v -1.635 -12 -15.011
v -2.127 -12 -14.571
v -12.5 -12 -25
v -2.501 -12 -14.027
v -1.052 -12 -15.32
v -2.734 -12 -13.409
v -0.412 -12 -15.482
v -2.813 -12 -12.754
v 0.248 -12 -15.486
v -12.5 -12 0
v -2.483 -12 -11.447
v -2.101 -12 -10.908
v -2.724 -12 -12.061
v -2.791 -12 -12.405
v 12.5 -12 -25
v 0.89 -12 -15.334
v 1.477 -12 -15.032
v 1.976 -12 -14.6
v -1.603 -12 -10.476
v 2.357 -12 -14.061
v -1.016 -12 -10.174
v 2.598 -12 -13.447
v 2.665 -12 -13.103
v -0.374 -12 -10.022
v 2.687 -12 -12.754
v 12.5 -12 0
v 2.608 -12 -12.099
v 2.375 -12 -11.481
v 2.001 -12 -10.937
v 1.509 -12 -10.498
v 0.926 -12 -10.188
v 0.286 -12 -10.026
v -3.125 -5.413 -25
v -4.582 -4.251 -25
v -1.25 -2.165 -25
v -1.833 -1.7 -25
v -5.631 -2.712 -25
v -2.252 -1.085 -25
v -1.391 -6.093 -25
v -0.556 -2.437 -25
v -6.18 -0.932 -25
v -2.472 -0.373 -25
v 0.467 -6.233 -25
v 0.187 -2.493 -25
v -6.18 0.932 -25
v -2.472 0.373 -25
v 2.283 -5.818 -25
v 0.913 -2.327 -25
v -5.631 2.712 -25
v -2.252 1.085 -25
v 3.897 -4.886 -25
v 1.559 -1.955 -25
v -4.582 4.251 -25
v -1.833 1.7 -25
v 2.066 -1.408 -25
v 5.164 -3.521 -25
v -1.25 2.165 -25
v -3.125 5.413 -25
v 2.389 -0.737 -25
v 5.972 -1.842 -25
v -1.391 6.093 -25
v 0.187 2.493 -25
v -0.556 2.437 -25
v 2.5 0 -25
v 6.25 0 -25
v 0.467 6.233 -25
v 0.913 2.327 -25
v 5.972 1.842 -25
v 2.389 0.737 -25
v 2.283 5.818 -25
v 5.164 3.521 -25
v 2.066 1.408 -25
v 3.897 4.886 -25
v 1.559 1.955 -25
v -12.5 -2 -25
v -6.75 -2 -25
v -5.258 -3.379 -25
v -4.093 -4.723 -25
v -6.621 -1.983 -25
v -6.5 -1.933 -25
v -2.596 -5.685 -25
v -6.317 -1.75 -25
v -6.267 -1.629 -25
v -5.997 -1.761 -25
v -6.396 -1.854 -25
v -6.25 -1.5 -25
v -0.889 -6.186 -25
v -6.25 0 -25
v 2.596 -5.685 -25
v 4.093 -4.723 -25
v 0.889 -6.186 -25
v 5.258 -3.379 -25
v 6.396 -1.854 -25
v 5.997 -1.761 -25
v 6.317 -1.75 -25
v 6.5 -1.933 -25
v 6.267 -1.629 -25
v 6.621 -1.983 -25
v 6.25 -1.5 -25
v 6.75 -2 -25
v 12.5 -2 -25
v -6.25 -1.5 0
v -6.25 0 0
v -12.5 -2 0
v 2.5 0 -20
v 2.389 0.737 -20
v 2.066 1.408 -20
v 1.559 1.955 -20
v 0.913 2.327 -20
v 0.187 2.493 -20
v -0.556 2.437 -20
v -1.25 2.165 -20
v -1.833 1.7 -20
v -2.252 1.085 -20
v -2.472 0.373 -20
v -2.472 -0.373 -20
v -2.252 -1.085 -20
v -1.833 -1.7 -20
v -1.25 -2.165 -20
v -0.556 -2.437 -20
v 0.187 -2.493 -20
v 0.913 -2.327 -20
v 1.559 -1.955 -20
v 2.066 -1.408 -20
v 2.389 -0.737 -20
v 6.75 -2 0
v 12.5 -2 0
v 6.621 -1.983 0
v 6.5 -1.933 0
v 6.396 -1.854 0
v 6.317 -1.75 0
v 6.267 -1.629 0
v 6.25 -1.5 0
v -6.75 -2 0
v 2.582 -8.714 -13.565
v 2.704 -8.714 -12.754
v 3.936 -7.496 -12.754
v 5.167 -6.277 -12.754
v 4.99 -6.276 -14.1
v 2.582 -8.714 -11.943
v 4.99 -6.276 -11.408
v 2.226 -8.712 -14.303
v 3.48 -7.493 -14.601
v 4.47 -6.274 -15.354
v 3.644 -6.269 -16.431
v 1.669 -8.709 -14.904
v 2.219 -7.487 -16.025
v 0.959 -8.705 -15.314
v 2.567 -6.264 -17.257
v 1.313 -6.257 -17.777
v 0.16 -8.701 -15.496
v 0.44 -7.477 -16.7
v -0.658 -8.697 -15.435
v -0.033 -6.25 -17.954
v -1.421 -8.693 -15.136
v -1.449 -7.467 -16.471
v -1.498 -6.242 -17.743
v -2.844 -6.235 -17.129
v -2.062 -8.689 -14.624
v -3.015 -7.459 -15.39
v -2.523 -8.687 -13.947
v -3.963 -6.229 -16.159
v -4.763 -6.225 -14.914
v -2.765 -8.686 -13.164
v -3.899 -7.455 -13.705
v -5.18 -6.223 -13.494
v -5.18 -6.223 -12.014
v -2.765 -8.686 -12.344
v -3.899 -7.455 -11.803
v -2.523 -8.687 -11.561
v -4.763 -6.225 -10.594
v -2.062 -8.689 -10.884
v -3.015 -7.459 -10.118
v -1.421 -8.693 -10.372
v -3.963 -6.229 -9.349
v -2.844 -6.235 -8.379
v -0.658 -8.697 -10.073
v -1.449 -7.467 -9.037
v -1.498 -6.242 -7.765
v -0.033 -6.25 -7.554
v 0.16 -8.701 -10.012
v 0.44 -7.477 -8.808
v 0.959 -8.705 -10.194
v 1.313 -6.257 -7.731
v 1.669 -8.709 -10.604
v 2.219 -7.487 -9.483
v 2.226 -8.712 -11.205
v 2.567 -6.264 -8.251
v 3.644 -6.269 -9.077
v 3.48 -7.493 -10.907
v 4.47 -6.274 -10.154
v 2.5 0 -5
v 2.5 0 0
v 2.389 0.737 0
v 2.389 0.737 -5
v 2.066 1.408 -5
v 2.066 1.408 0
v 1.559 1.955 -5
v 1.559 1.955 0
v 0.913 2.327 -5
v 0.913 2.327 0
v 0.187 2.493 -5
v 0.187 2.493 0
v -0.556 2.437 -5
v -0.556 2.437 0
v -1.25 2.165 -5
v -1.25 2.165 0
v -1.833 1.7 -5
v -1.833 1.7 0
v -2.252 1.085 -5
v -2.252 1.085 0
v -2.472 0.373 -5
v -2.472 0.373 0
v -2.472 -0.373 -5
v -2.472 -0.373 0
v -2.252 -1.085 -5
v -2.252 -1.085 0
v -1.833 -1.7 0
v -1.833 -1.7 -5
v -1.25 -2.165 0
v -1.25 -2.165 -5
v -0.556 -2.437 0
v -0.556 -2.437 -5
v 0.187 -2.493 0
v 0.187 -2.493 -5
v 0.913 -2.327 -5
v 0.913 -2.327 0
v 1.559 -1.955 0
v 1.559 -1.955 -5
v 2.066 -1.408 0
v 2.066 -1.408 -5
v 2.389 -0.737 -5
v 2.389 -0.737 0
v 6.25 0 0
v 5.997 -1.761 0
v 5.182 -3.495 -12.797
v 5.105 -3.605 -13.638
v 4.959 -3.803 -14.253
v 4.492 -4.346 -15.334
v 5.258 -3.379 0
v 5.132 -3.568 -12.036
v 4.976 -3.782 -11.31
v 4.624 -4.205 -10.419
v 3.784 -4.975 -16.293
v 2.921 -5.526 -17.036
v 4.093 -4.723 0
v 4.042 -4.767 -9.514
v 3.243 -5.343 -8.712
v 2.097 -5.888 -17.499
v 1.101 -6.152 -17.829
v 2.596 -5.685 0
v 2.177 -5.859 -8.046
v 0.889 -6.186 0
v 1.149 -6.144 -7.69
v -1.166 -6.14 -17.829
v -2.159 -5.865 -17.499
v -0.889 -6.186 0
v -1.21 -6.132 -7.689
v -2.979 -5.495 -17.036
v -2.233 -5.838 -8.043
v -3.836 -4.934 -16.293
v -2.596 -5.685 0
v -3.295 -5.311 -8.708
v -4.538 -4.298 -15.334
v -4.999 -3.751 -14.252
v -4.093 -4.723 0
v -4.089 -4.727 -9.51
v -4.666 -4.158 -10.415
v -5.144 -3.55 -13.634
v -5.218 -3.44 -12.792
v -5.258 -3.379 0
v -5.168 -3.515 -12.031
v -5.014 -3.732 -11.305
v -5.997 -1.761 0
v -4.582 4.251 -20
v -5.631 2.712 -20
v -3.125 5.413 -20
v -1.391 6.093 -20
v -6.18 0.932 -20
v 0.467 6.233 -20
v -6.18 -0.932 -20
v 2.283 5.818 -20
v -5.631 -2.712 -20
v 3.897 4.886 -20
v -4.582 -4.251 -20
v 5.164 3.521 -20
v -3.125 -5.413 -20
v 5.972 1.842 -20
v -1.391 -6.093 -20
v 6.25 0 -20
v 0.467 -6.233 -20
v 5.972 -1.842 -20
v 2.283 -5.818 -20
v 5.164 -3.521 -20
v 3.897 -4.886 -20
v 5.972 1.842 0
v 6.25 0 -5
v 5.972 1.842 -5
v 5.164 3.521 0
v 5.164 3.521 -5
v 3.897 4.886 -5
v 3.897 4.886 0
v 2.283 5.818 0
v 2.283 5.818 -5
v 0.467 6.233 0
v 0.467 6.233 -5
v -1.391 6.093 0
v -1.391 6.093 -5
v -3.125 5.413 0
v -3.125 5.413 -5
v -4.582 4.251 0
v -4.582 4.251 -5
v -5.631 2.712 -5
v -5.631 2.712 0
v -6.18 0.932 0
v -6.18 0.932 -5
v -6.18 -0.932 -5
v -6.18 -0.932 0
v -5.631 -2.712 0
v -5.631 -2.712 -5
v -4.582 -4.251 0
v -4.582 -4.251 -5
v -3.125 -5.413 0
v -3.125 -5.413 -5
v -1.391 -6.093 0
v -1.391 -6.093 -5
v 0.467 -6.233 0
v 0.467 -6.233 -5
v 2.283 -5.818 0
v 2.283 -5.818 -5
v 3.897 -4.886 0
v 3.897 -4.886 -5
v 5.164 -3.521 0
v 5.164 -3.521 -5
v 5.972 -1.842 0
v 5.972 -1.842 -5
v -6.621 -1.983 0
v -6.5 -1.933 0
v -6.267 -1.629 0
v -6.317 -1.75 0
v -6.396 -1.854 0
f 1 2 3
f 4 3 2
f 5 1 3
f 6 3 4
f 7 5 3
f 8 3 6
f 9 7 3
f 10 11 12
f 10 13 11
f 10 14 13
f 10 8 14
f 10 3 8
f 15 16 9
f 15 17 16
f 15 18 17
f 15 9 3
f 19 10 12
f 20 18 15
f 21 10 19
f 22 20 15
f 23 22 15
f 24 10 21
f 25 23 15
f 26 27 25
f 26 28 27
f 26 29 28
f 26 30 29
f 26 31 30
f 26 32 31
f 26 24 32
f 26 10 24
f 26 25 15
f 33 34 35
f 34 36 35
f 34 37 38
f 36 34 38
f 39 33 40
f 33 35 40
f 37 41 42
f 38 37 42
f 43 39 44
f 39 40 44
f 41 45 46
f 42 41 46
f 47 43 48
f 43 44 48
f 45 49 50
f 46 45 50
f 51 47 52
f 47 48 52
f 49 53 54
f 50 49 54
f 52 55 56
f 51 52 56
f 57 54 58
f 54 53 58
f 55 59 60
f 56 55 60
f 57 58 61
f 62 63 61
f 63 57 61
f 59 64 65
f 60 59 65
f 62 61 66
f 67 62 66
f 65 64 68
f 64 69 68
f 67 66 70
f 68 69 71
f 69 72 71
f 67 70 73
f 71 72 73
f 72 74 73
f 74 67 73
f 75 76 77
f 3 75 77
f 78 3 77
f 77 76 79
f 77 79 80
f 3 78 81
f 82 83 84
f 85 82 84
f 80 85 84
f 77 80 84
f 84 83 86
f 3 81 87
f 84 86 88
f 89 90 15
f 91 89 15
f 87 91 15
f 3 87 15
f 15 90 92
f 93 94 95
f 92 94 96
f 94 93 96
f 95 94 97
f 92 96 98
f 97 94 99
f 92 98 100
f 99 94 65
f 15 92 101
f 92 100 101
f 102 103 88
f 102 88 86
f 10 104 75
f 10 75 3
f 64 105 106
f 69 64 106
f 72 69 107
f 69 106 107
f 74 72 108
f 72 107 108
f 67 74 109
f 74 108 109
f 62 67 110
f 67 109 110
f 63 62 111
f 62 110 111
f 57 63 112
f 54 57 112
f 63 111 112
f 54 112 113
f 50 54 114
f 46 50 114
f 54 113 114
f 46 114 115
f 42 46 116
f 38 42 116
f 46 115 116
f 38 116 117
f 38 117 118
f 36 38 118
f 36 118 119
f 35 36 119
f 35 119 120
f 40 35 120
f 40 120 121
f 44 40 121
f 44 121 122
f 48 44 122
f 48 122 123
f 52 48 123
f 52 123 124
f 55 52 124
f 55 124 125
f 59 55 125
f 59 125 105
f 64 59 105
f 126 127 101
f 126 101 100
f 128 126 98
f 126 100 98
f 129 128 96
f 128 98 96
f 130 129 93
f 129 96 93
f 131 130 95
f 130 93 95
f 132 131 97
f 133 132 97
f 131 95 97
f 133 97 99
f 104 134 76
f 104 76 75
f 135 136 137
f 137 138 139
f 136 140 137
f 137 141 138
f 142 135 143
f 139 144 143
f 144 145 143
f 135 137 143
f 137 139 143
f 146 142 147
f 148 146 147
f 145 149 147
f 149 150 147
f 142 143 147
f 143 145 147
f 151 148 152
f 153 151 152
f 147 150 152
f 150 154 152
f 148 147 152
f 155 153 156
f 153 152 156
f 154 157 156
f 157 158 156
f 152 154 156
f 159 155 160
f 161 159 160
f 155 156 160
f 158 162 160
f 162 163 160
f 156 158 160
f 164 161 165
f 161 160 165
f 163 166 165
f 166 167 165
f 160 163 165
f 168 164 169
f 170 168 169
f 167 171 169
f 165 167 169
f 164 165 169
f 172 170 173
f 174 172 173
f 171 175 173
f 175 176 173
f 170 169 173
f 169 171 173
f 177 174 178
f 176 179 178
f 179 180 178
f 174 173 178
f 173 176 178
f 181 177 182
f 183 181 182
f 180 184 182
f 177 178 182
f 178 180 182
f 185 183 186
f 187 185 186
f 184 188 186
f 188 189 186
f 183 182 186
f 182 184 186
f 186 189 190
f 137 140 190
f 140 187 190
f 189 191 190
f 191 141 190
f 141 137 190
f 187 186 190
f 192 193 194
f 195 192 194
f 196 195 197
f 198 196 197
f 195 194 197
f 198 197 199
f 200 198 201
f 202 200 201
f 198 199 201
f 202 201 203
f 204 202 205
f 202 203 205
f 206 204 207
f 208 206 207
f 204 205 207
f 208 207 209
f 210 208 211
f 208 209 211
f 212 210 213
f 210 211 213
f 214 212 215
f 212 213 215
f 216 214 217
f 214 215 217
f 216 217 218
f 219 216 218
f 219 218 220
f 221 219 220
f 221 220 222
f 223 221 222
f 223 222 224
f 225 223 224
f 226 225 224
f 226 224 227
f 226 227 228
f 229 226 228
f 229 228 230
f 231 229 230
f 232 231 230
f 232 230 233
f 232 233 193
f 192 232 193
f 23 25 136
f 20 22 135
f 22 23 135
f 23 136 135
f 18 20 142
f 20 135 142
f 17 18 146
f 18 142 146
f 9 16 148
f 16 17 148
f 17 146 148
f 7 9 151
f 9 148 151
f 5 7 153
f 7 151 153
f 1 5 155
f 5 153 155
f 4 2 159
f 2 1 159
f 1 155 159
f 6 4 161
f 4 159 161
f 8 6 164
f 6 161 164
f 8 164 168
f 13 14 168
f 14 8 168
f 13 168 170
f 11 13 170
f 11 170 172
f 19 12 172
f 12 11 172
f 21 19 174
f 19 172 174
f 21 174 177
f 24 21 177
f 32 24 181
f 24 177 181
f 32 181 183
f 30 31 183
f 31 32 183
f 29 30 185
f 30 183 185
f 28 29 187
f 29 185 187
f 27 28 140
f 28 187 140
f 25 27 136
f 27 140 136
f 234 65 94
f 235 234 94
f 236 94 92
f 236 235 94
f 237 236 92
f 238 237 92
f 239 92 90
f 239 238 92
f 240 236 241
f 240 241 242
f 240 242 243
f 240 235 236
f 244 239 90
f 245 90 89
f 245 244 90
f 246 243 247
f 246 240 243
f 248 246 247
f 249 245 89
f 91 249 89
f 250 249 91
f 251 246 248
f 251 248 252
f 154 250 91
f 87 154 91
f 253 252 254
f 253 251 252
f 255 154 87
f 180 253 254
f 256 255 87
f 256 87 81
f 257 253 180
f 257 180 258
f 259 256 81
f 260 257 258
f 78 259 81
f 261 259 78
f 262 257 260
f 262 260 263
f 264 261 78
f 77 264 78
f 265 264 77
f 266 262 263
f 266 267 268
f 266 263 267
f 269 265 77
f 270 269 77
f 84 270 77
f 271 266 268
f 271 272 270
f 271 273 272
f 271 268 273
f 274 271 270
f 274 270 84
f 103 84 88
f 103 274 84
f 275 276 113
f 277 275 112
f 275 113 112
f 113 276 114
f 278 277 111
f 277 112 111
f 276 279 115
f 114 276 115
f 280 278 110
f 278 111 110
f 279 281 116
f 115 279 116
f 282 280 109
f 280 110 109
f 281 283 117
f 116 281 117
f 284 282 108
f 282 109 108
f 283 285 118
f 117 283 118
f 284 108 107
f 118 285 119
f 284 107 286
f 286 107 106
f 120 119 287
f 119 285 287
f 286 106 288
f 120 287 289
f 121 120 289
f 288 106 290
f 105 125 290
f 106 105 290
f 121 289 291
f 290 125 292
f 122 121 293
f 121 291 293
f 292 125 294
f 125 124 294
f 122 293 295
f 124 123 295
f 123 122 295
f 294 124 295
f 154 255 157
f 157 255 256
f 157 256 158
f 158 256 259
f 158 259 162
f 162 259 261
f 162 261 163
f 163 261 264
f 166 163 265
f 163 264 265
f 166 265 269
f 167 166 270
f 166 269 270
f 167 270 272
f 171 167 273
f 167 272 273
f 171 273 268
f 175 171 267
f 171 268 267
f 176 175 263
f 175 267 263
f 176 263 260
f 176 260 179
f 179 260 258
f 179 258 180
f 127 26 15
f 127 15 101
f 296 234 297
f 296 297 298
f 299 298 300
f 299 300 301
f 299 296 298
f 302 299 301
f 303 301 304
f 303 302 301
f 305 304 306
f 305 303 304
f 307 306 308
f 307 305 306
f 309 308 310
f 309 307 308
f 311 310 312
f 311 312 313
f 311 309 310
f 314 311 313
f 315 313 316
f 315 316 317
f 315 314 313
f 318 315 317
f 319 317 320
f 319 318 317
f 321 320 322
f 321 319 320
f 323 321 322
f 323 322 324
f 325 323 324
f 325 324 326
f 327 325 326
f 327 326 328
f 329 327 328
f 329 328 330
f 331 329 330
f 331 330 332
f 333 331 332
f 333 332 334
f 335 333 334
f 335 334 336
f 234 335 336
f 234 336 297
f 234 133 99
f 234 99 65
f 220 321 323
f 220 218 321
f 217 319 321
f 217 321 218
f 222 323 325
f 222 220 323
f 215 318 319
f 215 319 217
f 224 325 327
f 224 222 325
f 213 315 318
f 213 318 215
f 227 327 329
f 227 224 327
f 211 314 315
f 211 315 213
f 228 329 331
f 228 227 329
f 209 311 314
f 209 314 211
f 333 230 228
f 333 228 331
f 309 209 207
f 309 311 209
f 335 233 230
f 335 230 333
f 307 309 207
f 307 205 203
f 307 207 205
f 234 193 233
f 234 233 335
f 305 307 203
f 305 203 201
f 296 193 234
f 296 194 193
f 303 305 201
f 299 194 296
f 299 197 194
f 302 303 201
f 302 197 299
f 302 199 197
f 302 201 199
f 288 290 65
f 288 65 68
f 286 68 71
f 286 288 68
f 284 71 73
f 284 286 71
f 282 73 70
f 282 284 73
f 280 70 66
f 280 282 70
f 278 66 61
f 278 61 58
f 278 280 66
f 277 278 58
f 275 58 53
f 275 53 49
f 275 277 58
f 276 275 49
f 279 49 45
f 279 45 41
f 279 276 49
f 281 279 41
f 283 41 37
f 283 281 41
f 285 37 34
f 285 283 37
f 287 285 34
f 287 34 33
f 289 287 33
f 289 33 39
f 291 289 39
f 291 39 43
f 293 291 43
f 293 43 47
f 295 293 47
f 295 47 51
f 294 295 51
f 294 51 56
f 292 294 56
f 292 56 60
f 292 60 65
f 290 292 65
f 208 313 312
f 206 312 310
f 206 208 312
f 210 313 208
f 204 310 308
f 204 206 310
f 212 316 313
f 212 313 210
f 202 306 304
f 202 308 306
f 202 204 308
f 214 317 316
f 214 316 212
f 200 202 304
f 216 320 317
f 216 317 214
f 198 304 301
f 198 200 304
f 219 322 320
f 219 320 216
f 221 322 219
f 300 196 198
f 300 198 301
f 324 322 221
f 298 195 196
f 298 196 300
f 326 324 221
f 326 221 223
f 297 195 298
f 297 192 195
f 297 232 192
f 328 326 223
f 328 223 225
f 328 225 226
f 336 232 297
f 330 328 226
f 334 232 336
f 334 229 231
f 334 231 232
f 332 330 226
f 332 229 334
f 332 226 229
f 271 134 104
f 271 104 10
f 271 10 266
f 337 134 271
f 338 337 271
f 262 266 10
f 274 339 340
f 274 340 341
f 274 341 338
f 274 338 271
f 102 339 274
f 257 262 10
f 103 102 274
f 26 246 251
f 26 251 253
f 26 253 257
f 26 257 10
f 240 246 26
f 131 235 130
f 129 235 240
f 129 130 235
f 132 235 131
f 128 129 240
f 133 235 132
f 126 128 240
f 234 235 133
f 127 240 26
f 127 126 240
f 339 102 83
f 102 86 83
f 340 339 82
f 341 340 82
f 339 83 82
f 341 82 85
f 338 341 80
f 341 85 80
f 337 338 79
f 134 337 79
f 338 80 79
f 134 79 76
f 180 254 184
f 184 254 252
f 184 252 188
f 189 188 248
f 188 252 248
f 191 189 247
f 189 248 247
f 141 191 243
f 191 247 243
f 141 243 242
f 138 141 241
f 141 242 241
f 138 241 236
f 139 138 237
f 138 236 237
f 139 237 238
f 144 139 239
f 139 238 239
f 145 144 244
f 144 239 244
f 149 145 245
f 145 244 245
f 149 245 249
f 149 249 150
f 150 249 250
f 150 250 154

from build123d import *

# Parameters (mm, degrees)
SKETCH2_R           = 6.25
BOSS_EXTRUDE1_DEPTH = 25
BOSS_EXTRUDE2_DEPTH = 25
SKETCH5_R           = 2.5
CUT_EXTRUDE1_DEPTH  = 25
FILLET1_R           = 0.5
SKETCH6_W           = 25
SKETCH6_H           = 15
CUT_EXTRUDE2_DEPTH  = 10
SKETCH8_R           = 6.5
CUT_EXTRUDE5_DEPTH  = 15


# Read off the part's stored shape, not the designer's step: CSK for M5 Flat Head Machine Screw4
with BuildPart() as part:
    # Sketch2 → Boss-Extrude1 (new body)
    with BuildSketch(Plane.XY):
        Circle(SKETCH2_R)
    extrude(amount=-BOSS_EXTRUDE1_DEPTH)

    # Sketch5 → Cut-Extrude1 (cut)
    with BuildSketch(Plane.XY):
        Circle(SKETCH5_R)
    extrude(amount=-CUT_EXTRUDE1_DEPTH, mode=Mode.SUBTRACT)

    # Sketch6 → Cut-Extrude2 (cut)
    with BuildSketch(Plane(origin=(0, -2, 0), x_dir=(1, 0, 0), z_dir=(0, 1, 0))):
        with Locations((0, 12.5)):
            Rectangle(SKETCH6_W, SKETCH6_H)
    extrude(amount=CUT_EXTRUDE2_DEPTH, mode=Mode.SUBTRACT)

    # Sketch8 → Cut-Extrude5 (cut)
    with BuildSketch(Plane.XY.offset(-20)):
        Circle(SKETCH8_R)
    extrude(amount=CUT_EXTRUDE5_DEPTH, mode=Mode.SUBTRACT)


with BuildPart() as body_2:
    # Sketch4 → Boss-Extrude2 (new body)
    with BuildSketch(Plane.XY):
        with BuildLine():
            Line((-6.25, 0), (-6.25, -2))
            Line((-6.25, -2), (-12.5, -2))
            Line((-12.5, -2), (-12.5, -12))
            Line((-12.5, -12), (12.5, -12))
            Line((12.5, -12), (12.5, -2))
            Line((12.5, -2), (6.25, -2))
            Line((6.25, -2), (6.25, 0))
            ThreePointArc((6.25, 0), (0, -6.25), (-6.25, 0))
        make_face()
    extrude(amount=-BOSS_EXTRUDE2_DEPTH)

    # Fillet1
    fillet1_edges = [body_2.edges().sort_by_distance(p)[0] for p in [
        (6.25, -2, -12.5),
        (-6.25, -2, -12.5),
    ]]
    fillet(fillet1_edges, radius=FILLET1_R)

    # CSK for M5 Flat Head Machine Screw4 outl → CSK for M5 Flat Head Machine Screw4 (revolve, cut)
    with BuildSketch(Plane(origin=(0, 0, -12.753983412), x_dir=(0.9999862042460785, -0.005252743808715838, 0), z_dir=(0, 0, 1))):
        Polygon((2.75, -8.7), (5.2, -6.25), (5.2, -3.466872661), (2.75, -3.466872661), align=None)
        Polygon((2.75, -12.014610796), (2.75, -8.7), (2.75, -3.466872661), (0, -3.466872661), (0, -12.014610796), align=None)
    revolve(axis=Axis((0, 0, -12.753983412), (0.005252743808715838, 0.9999862042460785, 0)), mode=Mode.SUBTRACT)


with BuildPart() as cut_extrude5_piece_1:
    # of the separate pieces the step leaves, piece 1, a body of its own (cut_extrude5_pieces)
    add(part.part.solids().sort_by_distance((6.25, 0, 0))[0])


with BuildPart() as cut_extrude5_piece_2:
    # of the separate pieces the step leaves, piece 2, a body of its own (cut_extrude5_pieces)
    add(part.part.solids().sort_by_distance((6.25, 0, -20))[0])


solid = Compound([body_2.part, cut_extrude5_piece_1.part, cut_extrude5_piece_2.part])
